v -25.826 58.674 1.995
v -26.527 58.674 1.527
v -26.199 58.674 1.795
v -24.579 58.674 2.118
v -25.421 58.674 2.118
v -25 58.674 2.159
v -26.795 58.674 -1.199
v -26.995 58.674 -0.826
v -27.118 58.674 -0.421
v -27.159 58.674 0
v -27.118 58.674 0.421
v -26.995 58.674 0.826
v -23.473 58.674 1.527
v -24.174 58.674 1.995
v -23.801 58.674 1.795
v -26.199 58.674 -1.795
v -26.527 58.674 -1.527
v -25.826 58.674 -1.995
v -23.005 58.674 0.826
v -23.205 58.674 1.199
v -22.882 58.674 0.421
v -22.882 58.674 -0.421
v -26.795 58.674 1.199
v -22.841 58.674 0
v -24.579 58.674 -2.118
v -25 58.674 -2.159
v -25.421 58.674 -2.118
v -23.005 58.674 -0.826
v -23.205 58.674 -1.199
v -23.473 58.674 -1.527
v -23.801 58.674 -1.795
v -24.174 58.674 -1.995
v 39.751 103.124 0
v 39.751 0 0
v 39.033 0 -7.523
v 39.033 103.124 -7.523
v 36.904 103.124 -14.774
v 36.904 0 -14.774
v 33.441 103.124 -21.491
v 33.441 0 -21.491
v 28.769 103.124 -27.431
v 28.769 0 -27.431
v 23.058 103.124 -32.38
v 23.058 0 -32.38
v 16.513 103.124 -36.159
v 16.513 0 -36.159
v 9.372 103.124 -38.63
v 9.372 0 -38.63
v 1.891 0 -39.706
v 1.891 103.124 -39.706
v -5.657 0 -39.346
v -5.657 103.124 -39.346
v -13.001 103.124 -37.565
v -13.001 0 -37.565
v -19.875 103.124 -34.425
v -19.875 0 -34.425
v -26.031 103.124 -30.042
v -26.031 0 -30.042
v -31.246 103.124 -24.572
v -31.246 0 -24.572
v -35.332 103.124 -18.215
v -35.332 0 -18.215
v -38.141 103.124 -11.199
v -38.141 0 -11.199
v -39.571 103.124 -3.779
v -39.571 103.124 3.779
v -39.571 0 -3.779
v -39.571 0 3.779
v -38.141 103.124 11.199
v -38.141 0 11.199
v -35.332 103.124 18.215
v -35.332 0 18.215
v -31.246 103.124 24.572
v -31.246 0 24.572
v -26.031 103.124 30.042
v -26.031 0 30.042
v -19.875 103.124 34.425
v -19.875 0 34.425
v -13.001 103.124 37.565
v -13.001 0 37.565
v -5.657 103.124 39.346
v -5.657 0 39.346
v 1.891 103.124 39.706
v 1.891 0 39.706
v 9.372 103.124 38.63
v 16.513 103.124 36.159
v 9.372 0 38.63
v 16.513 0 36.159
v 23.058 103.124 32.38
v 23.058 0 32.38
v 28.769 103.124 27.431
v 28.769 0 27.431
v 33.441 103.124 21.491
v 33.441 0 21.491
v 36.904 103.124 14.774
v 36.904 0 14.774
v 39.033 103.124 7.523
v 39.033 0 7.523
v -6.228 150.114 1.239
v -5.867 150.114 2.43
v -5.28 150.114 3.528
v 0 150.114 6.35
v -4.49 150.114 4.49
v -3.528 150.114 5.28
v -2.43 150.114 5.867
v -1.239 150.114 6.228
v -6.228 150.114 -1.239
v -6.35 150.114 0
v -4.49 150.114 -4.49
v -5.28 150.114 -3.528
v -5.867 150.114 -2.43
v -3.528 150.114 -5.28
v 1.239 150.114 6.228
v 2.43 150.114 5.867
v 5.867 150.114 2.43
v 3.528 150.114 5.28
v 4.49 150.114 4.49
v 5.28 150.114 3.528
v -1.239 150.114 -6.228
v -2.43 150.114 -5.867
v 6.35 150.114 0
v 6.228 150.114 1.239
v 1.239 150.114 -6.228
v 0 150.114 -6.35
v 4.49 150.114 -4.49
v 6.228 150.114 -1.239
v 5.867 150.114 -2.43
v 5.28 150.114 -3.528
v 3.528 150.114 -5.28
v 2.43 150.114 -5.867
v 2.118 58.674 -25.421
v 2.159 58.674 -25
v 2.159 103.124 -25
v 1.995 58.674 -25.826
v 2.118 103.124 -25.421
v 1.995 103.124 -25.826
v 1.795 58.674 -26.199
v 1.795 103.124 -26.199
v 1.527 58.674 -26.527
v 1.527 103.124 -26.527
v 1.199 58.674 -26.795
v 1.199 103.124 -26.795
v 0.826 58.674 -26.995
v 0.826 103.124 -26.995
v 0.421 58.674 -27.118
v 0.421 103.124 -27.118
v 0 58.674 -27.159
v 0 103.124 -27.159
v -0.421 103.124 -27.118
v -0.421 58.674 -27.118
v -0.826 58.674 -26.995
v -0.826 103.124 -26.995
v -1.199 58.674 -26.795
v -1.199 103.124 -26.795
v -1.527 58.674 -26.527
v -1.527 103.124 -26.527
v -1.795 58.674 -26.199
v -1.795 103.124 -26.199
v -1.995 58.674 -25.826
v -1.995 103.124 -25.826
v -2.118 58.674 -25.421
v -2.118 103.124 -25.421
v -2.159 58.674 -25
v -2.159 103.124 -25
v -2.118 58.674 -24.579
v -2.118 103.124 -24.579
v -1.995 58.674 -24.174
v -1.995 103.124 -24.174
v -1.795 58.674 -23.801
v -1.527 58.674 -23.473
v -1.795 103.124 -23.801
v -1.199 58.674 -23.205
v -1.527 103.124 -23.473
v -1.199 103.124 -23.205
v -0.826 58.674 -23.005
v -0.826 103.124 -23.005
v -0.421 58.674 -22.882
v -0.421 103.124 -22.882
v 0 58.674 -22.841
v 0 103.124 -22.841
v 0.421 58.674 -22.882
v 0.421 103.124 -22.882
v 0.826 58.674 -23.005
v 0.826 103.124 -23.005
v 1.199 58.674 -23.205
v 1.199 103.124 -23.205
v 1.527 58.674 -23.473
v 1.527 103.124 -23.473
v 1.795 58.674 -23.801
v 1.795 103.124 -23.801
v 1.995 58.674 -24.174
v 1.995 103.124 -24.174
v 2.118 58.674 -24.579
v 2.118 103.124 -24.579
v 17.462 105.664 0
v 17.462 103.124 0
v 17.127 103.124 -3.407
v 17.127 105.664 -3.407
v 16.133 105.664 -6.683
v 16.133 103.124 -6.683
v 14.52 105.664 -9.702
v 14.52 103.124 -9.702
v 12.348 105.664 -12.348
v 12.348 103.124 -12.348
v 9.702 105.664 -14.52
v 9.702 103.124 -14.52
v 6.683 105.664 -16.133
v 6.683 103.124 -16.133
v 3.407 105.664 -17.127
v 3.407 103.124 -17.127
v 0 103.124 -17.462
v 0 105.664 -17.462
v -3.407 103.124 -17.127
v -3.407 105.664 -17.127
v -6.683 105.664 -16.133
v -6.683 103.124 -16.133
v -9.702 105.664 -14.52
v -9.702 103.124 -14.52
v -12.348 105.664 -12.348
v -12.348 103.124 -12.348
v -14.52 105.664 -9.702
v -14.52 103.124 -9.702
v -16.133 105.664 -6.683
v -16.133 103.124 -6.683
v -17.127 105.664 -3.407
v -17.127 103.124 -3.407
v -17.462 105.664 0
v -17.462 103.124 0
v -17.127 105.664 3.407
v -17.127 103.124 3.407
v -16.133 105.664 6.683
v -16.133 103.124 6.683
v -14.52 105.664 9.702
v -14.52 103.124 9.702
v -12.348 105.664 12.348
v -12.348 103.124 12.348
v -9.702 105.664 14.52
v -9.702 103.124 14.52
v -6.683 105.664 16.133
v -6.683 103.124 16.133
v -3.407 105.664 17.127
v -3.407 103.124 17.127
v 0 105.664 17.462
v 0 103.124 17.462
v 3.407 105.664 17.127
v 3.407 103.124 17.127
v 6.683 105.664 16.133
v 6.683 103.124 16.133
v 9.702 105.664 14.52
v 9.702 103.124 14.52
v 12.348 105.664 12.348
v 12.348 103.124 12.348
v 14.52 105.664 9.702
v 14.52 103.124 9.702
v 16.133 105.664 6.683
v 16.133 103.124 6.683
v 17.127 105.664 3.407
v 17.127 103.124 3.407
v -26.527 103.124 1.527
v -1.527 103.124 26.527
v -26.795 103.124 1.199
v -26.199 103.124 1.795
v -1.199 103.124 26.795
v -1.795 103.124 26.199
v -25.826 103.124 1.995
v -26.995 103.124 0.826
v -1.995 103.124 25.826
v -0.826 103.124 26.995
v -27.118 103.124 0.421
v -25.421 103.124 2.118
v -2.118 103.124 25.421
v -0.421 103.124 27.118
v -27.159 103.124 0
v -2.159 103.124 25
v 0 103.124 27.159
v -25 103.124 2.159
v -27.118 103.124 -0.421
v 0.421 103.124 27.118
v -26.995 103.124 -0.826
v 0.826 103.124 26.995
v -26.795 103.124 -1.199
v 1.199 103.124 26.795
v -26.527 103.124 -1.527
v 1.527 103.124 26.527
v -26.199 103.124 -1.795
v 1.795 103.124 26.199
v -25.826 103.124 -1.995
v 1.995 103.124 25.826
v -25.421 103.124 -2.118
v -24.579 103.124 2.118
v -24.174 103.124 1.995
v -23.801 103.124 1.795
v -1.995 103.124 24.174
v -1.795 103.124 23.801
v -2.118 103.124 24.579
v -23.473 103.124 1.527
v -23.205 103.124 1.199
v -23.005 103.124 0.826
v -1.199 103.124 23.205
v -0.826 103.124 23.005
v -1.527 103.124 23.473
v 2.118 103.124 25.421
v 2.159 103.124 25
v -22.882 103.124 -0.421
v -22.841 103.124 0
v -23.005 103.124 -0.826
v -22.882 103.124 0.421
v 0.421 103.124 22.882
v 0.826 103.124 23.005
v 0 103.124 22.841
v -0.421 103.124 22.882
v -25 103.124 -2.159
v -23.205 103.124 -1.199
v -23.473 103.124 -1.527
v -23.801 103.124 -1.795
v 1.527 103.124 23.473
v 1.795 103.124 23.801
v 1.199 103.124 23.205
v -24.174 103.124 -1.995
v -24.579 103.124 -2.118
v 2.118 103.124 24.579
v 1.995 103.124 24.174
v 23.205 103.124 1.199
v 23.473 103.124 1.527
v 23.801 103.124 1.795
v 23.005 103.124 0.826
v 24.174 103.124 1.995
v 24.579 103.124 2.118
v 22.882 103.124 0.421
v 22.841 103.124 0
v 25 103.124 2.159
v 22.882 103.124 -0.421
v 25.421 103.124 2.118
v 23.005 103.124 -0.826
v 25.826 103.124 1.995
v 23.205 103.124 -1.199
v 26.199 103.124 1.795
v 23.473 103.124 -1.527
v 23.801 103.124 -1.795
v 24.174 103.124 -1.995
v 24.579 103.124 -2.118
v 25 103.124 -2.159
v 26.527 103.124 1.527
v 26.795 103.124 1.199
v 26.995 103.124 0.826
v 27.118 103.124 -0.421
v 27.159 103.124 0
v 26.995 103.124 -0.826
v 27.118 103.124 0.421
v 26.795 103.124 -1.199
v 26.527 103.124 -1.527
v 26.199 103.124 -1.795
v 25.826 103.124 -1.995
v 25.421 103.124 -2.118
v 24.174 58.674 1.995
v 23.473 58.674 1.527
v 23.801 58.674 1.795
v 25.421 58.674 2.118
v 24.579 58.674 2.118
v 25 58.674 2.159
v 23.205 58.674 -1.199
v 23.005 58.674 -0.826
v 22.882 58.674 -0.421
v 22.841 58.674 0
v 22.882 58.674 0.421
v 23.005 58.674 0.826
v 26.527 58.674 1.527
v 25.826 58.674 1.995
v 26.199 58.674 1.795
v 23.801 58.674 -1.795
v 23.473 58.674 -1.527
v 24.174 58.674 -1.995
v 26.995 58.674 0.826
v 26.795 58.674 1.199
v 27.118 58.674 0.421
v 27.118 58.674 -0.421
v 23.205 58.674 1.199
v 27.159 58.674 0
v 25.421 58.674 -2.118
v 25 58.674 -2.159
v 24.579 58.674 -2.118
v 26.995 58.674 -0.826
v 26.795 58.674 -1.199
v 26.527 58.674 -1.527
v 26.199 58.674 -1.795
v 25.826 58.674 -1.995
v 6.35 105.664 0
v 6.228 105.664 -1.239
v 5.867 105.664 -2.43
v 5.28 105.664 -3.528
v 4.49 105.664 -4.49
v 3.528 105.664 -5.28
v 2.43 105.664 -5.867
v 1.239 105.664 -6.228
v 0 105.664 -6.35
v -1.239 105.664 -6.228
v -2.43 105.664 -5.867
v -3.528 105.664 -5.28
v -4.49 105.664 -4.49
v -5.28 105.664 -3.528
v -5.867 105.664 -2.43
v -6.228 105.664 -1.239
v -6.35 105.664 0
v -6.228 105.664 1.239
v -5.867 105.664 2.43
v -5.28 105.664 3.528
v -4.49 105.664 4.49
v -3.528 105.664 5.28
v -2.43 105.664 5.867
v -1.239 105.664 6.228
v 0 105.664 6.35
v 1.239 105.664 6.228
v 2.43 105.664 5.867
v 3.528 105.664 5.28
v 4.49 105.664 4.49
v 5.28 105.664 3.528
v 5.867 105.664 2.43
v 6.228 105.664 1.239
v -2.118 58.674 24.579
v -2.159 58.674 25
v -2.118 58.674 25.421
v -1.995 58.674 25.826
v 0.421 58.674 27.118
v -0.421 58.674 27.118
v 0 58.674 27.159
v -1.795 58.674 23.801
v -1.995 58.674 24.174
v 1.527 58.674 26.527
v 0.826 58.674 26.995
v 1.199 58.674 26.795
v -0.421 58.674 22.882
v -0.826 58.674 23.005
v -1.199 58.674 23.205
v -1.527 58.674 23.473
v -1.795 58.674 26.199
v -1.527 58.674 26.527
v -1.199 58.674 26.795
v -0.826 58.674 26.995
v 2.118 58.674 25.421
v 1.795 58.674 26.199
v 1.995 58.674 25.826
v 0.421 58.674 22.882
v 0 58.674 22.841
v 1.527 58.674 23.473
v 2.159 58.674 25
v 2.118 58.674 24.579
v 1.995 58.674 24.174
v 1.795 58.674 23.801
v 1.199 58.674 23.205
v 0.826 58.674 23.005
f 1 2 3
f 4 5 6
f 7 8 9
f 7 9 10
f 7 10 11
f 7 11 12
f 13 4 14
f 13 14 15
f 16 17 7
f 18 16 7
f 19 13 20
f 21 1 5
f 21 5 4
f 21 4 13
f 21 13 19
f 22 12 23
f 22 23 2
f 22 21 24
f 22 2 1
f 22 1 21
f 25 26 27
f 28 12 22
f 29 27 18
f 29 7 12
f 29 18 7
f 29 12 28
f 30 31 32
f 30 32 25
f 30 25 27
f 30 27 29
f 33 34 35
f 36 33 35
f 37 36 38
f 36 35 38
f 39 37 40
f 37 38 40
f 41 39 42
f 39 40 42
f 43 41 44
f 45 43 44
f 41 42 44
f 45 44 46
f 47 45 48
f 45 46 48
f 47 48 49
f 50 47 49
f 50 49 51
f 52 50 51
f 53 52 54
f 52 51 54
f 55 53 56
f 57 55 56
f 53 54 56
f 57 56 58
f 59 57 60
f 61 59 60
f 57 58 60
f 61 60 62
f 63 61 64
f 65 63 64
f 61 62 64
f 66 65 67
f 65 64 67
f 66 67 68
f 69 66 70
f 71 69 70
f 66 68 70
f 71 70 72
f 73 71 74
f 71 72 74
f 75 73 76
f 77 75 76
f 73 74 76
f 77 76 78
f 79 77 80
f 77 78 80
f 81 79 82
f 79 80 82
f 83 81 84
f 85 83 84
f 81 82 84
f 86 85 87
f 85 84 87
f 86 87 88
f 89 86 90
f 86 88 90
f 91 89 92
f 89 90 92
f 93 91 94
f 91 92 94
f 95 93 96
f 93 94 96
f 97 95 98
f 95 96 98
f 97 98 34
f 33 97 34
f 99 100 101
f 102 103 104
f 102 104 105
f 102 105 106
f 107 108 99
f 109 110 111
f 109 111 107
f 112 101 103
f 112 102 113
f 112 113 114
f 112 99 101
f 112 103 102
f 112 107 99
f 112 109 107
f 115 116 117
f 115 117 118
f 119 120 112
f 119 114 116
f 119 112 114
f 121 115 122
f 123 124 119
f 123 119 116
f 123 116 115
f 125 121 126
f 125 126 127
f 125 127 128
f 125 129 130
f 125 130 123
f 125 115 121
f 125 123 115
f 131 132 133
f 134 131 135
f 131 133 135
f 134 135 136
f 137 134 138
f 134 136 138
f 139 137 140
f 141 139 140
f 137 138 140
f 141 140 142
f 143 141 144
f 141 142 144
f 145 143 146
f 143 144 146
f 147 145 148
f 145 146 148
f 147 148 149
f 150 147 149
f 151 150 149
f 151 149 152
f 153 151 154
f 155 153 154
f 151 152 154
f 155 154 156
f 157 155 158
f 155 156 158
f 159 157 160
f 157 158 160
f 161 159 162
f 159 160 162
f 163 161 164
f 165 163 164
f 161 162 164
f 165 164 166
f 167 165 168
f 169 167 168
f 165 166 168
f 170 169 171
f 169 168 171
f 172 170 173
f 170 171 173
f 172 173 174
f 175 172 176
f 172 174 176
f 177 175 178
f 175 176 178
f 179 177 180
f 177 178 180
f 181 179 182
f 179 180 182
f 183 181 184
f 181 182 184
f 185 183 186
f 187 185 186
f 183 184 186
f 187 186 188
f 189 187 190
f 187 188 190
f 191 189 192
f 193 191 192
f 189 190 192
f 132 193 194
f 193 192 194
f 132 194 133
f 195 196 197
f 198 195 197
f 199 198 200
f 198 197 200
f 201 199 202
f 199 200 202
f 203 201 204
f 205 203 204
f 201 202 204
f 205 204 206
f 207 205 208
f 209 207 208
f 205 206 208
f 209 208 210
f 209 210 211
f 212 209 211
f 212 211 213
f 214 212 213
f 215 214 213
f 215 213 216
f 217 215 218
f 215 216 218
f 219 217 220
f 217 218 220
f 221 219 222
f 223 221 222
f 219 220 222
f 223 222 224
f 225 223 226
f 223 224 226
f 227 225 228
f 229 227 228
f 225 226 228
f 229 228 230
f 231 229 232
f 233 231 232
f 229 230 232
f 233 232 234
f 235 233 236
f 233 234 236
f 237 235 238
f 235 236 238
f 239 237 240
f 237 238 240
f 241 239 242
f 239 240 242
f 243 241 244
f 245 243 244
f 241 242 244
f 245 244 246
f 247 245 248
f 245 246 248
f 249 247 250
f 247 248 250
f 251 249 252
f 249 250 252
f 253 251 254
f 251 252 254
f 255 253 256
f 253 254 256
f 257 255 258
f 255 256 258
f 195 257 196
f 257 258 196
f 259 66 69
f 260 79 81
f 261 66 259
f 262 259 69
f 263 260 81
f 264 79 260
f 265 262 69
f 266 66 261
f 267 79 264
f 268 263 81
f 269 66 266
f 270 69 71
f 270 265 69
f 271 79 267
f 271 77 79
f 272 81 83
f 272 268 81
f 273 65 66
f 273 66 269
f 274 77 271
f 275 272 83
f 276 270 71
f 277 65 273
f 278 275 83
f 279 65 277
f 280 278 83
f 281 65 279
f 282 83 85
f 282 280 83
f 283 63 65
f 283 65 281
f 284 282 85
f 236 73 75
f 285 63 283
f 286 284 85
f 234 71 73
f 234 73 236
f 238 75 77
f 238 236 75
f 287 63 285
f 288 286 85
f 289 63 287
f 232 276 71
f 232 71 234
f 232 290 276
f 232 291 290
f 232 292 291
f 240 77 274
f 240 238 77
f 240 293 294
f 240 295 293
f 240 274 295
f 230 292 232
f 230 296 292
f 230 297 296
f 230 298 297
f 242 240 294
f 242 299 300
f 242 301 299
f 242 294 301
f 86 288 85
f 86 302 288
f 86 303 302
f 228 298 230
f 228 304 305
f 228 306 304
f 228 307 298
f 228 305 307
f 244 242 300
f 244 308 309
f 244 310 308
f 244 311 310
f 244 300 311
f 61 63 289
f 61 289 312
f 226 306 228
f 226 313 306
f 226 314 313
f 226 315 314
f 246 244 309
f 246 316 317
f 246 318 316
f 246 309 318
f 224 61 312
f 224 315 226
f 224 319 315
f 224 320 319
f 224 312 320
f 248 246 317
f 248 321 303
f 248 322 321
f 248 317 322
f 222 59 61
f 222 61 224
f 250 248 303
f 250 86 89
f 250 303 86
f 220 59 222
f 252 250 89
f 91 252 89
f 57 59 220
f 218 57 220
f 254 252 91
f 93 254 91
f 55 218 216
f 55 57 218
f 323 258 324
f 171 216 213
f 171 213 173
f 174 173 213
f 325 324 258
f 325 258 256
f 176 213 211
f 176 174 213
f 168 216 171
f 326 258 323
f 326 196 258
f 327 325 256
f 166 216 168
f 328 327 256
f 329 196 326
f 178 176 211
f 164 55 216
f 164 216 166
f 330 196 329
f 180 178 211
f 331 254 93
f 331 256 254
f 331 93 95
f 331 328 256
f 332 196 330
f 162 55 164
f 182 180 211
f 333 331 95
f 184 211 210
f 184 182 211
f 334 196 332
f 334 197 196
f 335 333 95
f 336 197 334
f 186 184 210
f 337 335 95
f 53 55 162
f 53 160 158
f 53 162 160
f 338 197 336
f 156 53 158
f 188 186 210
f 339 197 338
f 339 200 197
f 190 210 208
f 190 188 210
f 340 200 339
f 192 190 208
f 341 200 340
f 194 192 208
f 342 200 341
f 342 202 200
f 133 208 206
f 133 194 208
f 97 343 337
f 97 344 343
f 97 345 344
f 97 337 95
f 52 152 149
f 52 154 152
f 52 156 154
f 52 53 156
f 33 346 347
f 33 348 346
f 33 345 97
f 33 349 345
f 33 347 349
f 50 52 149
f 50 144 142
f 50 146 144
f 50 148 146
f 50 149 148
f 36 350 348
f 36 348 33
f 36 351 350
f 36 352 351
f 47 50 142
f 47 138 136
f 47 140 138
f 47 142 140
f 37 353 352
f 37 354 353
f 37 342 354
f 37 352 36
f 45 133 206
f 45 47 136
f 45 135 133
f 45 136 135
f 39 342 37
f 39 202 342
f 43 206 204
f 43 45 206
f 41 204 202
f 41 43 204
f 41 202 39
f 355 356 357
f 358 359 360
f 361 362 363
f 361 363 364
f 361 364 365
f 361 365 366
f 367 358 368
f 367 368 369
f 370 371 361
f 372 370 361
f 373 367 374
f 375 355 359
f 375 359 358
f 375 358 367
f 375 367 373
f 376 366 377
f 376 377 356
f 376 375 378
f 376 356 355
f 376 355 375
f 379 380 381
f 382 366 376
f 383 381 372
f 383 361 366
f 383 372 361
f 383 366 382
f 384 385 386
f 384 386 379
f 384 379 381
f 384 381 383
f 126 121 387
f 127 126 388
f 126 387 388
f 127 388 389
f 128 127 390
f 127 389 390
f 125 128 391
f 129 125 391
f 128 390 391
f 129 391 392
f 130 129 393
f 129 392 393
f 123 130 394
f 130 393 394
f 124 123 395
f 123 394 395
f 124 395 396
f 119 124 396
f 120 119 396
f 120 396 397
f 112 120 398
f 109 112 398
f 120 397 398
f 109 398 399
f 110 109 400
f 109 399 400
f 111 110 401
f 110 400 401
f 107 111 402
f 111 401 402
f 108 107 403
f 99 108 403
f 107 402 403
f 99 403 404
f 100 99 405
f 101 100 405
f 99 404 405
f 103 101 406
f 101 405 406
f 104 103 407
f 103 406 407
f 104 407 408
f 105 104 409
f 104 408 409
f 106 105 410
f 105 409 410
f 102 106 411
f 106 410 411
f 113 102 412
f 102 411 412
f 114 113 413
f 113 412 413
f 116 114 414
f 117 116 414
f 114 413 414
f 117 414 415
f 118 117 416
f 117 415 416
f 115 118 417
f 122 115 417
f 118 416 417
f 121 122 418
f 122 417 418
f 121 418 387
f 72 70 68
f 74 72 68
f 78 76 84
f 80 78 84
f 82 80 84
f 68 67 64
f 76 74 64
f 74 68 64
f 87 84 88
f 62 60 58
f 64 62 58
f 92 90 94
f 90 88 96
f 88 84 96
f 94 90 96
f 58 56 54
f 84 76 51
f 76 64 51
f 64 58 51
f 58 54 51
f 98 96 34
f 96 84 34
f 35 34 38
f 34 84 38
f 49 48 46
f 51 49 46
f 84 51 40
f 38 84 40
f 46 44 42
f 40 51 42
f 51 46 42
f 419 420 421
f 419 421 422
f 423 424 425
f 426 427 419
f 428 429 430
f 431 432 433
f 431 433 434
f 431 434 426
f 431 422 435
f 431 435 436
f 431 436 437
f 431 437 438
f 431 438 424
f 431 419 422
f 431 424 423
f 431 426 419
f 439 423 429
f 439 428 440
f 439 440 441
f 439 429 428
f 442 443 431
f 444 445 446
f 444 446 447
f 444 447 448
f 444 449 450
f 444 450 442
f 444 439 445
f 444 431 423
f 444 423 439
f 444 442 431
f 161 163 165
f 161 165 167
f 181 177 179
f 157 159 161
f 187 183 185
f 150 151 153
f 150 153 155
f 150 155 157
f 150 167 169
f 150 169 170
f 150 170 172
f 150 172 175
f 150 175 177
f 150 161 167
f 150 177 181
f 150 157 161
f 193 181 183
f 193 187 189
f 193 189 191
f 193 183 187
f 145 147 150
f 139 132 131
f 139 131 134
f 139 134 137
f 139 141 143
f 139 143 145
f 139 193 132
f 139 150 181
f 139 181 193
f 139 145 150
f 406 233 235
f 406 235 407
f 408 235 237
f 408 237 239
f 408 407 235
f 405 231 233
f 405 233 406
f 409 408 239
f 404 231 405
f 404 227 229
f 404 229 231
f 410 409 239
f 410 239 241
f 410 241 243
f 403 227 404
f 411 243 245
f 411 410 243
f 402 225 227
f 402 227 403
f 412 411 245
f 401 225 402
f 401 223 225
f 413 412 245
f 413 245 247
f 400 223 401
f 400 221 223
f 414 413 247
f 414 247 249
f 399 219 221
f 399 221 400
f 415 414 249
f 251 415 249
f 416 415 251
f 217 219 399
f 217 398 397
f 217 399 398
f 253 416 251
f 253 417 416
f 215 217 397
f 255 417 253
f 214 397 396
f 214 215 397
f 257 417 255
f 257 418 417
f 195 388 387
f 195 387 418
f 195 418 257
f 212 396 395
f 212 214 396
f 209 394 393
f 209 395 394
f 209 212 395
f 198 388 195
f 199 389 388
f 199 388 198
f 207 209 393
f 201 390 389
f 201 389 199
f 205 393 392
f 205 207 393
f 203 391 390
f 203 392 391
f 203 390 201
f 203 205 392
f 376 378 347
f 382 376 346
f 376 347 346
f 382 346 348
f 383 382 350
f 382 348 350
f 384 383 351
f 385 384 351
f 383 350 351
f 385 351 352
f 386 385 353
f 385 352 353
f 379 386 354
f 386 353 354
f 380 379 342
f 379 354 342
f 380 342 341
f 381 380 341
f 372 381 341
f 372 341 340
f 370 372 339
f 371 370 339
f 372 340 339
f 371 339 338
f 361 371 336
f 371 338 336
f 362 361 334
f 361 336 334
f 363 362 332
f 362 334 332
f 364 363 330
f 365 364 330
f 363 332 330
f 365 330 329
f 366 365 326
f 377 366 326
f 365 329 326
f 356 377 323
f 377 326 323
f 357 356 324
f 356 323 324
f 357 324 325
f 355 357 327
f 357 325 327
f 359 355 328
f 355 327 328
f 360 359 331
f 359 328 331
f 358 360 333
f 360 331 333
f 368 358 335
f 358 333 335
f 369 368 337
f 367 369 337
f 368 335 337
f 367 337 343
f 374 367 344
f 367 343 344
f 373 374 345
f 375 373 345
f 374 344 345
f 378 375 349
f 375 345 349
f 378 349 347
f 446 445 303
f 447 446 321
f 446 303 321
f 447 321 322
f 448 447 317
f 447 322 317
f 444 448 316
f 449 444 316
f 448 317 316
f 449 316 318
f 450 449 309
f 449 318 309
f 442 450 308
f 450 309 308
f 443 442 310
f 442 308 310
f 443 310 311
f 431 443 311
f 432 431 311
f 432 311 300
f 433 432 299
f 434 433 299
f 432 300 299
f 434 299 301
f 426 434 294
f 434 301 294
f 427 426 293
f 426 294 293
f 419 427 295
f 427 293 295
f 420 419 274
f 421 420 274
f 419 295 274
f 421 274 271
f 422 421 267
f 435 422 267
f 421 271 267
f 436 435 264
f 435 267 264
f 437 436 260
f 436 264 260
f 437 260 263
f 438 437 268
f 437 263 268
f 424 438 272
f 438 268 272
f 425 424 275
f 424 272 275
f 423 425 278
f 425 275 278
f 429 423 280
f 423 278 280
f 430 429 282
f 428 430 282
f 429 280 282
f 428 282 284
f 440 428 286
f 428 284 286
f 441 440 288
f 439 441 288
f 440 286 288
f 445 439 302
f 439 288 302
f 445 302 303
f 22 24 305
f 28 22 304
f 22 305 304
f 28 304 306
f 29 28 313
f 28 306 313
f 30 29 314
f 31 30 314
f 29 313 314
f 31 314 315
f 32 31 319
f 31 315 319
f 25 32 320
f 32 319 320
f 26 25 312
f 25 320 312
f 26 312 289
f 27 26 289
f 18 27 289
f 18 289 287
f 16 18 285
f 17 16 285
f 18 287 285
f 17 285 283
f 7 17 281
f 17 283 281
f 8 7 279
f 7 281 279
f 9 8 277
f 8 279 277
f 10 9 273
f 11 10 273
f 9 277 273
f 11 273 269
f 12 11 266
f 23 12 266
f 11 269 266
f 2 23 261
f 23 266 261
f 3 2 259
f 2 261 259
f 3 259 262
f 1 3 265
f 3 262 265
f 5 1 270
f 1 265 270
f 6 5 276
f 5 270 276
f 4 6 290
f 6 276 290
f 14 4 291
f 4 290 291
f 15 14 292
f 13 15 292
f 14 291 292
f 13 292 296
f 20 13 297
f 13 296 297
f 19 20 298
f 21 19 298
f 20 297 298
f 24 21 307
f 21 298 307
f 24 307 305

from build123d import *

# Parameters (mm, degrees)
SKETCH1_R           = 39.751
BOSS_EXTRUDE1_DEPTH = 103.124
SKETCH2_R           = 17.4625
BOSS_EXTRUDE2_DEPTH = 2.54
SKETCH3_R           = 6.35
BOSS_EXTRUDE3_DEPTH = 44.45
SKETCH4_R           = 2.159
CUT_EXTRUDE1_DEPTH  = 44.45


with BuildPart() as part:
    # Sketch1 → Boss-Extrude1 (new body)
    with BuildSketch(Plane(origin=(0, 0, 0), x_dir=(1, 0, 0), z_dir=(0, 1, 0))):
        Circle(SKETCH1_R)
    extrude(amount=BOSS_EXTRUDE1_DEPTH)

    # Sketch2 → Boss-Extrude2 (add)
    with BuildSketch(Plane(origin=(0, 103.124, 0), x_dir=(1, 0, 0), z_dir=(0, 1, 0))):
        Circle(SKETCH2_R)
    extrude(amount=BOSS_EXTRUDE2_DEPTH)

    # Sketch3 → Boss-Extrude3 (add)
    with BuildSketch(Plane(origin=(0, 105.664, 0), x_dir=(1, 0, 0), z_dir=(0, 1, 0))):
        Circle(SKETCH3_R)
    extrude(amount=BOSS_EXTRUDE3_DEPTH)

    # Sketch4 → Cut-Extrude1 (cut)
    with BuildSketch(Plane(origin=(0, 103.124, 0), x_dir=(1, 0, 0), z_dir=(0, 1, 0))):
        with Locations((0, 25)):
            Circle(SKETCH4_R)
        with Locations((25, 0)):
            Circle(SKETCH4_R)
        with Locations((0, -25)):
            Circle(SKETCH4_R)
        with Locations((-25, 0)):
            Circle(SKETCH4_R)
    extrude(amount=-CUT_EXTRUDE1_DEPTH, mode=Mode.SUBTRACT)


solid = part.part
